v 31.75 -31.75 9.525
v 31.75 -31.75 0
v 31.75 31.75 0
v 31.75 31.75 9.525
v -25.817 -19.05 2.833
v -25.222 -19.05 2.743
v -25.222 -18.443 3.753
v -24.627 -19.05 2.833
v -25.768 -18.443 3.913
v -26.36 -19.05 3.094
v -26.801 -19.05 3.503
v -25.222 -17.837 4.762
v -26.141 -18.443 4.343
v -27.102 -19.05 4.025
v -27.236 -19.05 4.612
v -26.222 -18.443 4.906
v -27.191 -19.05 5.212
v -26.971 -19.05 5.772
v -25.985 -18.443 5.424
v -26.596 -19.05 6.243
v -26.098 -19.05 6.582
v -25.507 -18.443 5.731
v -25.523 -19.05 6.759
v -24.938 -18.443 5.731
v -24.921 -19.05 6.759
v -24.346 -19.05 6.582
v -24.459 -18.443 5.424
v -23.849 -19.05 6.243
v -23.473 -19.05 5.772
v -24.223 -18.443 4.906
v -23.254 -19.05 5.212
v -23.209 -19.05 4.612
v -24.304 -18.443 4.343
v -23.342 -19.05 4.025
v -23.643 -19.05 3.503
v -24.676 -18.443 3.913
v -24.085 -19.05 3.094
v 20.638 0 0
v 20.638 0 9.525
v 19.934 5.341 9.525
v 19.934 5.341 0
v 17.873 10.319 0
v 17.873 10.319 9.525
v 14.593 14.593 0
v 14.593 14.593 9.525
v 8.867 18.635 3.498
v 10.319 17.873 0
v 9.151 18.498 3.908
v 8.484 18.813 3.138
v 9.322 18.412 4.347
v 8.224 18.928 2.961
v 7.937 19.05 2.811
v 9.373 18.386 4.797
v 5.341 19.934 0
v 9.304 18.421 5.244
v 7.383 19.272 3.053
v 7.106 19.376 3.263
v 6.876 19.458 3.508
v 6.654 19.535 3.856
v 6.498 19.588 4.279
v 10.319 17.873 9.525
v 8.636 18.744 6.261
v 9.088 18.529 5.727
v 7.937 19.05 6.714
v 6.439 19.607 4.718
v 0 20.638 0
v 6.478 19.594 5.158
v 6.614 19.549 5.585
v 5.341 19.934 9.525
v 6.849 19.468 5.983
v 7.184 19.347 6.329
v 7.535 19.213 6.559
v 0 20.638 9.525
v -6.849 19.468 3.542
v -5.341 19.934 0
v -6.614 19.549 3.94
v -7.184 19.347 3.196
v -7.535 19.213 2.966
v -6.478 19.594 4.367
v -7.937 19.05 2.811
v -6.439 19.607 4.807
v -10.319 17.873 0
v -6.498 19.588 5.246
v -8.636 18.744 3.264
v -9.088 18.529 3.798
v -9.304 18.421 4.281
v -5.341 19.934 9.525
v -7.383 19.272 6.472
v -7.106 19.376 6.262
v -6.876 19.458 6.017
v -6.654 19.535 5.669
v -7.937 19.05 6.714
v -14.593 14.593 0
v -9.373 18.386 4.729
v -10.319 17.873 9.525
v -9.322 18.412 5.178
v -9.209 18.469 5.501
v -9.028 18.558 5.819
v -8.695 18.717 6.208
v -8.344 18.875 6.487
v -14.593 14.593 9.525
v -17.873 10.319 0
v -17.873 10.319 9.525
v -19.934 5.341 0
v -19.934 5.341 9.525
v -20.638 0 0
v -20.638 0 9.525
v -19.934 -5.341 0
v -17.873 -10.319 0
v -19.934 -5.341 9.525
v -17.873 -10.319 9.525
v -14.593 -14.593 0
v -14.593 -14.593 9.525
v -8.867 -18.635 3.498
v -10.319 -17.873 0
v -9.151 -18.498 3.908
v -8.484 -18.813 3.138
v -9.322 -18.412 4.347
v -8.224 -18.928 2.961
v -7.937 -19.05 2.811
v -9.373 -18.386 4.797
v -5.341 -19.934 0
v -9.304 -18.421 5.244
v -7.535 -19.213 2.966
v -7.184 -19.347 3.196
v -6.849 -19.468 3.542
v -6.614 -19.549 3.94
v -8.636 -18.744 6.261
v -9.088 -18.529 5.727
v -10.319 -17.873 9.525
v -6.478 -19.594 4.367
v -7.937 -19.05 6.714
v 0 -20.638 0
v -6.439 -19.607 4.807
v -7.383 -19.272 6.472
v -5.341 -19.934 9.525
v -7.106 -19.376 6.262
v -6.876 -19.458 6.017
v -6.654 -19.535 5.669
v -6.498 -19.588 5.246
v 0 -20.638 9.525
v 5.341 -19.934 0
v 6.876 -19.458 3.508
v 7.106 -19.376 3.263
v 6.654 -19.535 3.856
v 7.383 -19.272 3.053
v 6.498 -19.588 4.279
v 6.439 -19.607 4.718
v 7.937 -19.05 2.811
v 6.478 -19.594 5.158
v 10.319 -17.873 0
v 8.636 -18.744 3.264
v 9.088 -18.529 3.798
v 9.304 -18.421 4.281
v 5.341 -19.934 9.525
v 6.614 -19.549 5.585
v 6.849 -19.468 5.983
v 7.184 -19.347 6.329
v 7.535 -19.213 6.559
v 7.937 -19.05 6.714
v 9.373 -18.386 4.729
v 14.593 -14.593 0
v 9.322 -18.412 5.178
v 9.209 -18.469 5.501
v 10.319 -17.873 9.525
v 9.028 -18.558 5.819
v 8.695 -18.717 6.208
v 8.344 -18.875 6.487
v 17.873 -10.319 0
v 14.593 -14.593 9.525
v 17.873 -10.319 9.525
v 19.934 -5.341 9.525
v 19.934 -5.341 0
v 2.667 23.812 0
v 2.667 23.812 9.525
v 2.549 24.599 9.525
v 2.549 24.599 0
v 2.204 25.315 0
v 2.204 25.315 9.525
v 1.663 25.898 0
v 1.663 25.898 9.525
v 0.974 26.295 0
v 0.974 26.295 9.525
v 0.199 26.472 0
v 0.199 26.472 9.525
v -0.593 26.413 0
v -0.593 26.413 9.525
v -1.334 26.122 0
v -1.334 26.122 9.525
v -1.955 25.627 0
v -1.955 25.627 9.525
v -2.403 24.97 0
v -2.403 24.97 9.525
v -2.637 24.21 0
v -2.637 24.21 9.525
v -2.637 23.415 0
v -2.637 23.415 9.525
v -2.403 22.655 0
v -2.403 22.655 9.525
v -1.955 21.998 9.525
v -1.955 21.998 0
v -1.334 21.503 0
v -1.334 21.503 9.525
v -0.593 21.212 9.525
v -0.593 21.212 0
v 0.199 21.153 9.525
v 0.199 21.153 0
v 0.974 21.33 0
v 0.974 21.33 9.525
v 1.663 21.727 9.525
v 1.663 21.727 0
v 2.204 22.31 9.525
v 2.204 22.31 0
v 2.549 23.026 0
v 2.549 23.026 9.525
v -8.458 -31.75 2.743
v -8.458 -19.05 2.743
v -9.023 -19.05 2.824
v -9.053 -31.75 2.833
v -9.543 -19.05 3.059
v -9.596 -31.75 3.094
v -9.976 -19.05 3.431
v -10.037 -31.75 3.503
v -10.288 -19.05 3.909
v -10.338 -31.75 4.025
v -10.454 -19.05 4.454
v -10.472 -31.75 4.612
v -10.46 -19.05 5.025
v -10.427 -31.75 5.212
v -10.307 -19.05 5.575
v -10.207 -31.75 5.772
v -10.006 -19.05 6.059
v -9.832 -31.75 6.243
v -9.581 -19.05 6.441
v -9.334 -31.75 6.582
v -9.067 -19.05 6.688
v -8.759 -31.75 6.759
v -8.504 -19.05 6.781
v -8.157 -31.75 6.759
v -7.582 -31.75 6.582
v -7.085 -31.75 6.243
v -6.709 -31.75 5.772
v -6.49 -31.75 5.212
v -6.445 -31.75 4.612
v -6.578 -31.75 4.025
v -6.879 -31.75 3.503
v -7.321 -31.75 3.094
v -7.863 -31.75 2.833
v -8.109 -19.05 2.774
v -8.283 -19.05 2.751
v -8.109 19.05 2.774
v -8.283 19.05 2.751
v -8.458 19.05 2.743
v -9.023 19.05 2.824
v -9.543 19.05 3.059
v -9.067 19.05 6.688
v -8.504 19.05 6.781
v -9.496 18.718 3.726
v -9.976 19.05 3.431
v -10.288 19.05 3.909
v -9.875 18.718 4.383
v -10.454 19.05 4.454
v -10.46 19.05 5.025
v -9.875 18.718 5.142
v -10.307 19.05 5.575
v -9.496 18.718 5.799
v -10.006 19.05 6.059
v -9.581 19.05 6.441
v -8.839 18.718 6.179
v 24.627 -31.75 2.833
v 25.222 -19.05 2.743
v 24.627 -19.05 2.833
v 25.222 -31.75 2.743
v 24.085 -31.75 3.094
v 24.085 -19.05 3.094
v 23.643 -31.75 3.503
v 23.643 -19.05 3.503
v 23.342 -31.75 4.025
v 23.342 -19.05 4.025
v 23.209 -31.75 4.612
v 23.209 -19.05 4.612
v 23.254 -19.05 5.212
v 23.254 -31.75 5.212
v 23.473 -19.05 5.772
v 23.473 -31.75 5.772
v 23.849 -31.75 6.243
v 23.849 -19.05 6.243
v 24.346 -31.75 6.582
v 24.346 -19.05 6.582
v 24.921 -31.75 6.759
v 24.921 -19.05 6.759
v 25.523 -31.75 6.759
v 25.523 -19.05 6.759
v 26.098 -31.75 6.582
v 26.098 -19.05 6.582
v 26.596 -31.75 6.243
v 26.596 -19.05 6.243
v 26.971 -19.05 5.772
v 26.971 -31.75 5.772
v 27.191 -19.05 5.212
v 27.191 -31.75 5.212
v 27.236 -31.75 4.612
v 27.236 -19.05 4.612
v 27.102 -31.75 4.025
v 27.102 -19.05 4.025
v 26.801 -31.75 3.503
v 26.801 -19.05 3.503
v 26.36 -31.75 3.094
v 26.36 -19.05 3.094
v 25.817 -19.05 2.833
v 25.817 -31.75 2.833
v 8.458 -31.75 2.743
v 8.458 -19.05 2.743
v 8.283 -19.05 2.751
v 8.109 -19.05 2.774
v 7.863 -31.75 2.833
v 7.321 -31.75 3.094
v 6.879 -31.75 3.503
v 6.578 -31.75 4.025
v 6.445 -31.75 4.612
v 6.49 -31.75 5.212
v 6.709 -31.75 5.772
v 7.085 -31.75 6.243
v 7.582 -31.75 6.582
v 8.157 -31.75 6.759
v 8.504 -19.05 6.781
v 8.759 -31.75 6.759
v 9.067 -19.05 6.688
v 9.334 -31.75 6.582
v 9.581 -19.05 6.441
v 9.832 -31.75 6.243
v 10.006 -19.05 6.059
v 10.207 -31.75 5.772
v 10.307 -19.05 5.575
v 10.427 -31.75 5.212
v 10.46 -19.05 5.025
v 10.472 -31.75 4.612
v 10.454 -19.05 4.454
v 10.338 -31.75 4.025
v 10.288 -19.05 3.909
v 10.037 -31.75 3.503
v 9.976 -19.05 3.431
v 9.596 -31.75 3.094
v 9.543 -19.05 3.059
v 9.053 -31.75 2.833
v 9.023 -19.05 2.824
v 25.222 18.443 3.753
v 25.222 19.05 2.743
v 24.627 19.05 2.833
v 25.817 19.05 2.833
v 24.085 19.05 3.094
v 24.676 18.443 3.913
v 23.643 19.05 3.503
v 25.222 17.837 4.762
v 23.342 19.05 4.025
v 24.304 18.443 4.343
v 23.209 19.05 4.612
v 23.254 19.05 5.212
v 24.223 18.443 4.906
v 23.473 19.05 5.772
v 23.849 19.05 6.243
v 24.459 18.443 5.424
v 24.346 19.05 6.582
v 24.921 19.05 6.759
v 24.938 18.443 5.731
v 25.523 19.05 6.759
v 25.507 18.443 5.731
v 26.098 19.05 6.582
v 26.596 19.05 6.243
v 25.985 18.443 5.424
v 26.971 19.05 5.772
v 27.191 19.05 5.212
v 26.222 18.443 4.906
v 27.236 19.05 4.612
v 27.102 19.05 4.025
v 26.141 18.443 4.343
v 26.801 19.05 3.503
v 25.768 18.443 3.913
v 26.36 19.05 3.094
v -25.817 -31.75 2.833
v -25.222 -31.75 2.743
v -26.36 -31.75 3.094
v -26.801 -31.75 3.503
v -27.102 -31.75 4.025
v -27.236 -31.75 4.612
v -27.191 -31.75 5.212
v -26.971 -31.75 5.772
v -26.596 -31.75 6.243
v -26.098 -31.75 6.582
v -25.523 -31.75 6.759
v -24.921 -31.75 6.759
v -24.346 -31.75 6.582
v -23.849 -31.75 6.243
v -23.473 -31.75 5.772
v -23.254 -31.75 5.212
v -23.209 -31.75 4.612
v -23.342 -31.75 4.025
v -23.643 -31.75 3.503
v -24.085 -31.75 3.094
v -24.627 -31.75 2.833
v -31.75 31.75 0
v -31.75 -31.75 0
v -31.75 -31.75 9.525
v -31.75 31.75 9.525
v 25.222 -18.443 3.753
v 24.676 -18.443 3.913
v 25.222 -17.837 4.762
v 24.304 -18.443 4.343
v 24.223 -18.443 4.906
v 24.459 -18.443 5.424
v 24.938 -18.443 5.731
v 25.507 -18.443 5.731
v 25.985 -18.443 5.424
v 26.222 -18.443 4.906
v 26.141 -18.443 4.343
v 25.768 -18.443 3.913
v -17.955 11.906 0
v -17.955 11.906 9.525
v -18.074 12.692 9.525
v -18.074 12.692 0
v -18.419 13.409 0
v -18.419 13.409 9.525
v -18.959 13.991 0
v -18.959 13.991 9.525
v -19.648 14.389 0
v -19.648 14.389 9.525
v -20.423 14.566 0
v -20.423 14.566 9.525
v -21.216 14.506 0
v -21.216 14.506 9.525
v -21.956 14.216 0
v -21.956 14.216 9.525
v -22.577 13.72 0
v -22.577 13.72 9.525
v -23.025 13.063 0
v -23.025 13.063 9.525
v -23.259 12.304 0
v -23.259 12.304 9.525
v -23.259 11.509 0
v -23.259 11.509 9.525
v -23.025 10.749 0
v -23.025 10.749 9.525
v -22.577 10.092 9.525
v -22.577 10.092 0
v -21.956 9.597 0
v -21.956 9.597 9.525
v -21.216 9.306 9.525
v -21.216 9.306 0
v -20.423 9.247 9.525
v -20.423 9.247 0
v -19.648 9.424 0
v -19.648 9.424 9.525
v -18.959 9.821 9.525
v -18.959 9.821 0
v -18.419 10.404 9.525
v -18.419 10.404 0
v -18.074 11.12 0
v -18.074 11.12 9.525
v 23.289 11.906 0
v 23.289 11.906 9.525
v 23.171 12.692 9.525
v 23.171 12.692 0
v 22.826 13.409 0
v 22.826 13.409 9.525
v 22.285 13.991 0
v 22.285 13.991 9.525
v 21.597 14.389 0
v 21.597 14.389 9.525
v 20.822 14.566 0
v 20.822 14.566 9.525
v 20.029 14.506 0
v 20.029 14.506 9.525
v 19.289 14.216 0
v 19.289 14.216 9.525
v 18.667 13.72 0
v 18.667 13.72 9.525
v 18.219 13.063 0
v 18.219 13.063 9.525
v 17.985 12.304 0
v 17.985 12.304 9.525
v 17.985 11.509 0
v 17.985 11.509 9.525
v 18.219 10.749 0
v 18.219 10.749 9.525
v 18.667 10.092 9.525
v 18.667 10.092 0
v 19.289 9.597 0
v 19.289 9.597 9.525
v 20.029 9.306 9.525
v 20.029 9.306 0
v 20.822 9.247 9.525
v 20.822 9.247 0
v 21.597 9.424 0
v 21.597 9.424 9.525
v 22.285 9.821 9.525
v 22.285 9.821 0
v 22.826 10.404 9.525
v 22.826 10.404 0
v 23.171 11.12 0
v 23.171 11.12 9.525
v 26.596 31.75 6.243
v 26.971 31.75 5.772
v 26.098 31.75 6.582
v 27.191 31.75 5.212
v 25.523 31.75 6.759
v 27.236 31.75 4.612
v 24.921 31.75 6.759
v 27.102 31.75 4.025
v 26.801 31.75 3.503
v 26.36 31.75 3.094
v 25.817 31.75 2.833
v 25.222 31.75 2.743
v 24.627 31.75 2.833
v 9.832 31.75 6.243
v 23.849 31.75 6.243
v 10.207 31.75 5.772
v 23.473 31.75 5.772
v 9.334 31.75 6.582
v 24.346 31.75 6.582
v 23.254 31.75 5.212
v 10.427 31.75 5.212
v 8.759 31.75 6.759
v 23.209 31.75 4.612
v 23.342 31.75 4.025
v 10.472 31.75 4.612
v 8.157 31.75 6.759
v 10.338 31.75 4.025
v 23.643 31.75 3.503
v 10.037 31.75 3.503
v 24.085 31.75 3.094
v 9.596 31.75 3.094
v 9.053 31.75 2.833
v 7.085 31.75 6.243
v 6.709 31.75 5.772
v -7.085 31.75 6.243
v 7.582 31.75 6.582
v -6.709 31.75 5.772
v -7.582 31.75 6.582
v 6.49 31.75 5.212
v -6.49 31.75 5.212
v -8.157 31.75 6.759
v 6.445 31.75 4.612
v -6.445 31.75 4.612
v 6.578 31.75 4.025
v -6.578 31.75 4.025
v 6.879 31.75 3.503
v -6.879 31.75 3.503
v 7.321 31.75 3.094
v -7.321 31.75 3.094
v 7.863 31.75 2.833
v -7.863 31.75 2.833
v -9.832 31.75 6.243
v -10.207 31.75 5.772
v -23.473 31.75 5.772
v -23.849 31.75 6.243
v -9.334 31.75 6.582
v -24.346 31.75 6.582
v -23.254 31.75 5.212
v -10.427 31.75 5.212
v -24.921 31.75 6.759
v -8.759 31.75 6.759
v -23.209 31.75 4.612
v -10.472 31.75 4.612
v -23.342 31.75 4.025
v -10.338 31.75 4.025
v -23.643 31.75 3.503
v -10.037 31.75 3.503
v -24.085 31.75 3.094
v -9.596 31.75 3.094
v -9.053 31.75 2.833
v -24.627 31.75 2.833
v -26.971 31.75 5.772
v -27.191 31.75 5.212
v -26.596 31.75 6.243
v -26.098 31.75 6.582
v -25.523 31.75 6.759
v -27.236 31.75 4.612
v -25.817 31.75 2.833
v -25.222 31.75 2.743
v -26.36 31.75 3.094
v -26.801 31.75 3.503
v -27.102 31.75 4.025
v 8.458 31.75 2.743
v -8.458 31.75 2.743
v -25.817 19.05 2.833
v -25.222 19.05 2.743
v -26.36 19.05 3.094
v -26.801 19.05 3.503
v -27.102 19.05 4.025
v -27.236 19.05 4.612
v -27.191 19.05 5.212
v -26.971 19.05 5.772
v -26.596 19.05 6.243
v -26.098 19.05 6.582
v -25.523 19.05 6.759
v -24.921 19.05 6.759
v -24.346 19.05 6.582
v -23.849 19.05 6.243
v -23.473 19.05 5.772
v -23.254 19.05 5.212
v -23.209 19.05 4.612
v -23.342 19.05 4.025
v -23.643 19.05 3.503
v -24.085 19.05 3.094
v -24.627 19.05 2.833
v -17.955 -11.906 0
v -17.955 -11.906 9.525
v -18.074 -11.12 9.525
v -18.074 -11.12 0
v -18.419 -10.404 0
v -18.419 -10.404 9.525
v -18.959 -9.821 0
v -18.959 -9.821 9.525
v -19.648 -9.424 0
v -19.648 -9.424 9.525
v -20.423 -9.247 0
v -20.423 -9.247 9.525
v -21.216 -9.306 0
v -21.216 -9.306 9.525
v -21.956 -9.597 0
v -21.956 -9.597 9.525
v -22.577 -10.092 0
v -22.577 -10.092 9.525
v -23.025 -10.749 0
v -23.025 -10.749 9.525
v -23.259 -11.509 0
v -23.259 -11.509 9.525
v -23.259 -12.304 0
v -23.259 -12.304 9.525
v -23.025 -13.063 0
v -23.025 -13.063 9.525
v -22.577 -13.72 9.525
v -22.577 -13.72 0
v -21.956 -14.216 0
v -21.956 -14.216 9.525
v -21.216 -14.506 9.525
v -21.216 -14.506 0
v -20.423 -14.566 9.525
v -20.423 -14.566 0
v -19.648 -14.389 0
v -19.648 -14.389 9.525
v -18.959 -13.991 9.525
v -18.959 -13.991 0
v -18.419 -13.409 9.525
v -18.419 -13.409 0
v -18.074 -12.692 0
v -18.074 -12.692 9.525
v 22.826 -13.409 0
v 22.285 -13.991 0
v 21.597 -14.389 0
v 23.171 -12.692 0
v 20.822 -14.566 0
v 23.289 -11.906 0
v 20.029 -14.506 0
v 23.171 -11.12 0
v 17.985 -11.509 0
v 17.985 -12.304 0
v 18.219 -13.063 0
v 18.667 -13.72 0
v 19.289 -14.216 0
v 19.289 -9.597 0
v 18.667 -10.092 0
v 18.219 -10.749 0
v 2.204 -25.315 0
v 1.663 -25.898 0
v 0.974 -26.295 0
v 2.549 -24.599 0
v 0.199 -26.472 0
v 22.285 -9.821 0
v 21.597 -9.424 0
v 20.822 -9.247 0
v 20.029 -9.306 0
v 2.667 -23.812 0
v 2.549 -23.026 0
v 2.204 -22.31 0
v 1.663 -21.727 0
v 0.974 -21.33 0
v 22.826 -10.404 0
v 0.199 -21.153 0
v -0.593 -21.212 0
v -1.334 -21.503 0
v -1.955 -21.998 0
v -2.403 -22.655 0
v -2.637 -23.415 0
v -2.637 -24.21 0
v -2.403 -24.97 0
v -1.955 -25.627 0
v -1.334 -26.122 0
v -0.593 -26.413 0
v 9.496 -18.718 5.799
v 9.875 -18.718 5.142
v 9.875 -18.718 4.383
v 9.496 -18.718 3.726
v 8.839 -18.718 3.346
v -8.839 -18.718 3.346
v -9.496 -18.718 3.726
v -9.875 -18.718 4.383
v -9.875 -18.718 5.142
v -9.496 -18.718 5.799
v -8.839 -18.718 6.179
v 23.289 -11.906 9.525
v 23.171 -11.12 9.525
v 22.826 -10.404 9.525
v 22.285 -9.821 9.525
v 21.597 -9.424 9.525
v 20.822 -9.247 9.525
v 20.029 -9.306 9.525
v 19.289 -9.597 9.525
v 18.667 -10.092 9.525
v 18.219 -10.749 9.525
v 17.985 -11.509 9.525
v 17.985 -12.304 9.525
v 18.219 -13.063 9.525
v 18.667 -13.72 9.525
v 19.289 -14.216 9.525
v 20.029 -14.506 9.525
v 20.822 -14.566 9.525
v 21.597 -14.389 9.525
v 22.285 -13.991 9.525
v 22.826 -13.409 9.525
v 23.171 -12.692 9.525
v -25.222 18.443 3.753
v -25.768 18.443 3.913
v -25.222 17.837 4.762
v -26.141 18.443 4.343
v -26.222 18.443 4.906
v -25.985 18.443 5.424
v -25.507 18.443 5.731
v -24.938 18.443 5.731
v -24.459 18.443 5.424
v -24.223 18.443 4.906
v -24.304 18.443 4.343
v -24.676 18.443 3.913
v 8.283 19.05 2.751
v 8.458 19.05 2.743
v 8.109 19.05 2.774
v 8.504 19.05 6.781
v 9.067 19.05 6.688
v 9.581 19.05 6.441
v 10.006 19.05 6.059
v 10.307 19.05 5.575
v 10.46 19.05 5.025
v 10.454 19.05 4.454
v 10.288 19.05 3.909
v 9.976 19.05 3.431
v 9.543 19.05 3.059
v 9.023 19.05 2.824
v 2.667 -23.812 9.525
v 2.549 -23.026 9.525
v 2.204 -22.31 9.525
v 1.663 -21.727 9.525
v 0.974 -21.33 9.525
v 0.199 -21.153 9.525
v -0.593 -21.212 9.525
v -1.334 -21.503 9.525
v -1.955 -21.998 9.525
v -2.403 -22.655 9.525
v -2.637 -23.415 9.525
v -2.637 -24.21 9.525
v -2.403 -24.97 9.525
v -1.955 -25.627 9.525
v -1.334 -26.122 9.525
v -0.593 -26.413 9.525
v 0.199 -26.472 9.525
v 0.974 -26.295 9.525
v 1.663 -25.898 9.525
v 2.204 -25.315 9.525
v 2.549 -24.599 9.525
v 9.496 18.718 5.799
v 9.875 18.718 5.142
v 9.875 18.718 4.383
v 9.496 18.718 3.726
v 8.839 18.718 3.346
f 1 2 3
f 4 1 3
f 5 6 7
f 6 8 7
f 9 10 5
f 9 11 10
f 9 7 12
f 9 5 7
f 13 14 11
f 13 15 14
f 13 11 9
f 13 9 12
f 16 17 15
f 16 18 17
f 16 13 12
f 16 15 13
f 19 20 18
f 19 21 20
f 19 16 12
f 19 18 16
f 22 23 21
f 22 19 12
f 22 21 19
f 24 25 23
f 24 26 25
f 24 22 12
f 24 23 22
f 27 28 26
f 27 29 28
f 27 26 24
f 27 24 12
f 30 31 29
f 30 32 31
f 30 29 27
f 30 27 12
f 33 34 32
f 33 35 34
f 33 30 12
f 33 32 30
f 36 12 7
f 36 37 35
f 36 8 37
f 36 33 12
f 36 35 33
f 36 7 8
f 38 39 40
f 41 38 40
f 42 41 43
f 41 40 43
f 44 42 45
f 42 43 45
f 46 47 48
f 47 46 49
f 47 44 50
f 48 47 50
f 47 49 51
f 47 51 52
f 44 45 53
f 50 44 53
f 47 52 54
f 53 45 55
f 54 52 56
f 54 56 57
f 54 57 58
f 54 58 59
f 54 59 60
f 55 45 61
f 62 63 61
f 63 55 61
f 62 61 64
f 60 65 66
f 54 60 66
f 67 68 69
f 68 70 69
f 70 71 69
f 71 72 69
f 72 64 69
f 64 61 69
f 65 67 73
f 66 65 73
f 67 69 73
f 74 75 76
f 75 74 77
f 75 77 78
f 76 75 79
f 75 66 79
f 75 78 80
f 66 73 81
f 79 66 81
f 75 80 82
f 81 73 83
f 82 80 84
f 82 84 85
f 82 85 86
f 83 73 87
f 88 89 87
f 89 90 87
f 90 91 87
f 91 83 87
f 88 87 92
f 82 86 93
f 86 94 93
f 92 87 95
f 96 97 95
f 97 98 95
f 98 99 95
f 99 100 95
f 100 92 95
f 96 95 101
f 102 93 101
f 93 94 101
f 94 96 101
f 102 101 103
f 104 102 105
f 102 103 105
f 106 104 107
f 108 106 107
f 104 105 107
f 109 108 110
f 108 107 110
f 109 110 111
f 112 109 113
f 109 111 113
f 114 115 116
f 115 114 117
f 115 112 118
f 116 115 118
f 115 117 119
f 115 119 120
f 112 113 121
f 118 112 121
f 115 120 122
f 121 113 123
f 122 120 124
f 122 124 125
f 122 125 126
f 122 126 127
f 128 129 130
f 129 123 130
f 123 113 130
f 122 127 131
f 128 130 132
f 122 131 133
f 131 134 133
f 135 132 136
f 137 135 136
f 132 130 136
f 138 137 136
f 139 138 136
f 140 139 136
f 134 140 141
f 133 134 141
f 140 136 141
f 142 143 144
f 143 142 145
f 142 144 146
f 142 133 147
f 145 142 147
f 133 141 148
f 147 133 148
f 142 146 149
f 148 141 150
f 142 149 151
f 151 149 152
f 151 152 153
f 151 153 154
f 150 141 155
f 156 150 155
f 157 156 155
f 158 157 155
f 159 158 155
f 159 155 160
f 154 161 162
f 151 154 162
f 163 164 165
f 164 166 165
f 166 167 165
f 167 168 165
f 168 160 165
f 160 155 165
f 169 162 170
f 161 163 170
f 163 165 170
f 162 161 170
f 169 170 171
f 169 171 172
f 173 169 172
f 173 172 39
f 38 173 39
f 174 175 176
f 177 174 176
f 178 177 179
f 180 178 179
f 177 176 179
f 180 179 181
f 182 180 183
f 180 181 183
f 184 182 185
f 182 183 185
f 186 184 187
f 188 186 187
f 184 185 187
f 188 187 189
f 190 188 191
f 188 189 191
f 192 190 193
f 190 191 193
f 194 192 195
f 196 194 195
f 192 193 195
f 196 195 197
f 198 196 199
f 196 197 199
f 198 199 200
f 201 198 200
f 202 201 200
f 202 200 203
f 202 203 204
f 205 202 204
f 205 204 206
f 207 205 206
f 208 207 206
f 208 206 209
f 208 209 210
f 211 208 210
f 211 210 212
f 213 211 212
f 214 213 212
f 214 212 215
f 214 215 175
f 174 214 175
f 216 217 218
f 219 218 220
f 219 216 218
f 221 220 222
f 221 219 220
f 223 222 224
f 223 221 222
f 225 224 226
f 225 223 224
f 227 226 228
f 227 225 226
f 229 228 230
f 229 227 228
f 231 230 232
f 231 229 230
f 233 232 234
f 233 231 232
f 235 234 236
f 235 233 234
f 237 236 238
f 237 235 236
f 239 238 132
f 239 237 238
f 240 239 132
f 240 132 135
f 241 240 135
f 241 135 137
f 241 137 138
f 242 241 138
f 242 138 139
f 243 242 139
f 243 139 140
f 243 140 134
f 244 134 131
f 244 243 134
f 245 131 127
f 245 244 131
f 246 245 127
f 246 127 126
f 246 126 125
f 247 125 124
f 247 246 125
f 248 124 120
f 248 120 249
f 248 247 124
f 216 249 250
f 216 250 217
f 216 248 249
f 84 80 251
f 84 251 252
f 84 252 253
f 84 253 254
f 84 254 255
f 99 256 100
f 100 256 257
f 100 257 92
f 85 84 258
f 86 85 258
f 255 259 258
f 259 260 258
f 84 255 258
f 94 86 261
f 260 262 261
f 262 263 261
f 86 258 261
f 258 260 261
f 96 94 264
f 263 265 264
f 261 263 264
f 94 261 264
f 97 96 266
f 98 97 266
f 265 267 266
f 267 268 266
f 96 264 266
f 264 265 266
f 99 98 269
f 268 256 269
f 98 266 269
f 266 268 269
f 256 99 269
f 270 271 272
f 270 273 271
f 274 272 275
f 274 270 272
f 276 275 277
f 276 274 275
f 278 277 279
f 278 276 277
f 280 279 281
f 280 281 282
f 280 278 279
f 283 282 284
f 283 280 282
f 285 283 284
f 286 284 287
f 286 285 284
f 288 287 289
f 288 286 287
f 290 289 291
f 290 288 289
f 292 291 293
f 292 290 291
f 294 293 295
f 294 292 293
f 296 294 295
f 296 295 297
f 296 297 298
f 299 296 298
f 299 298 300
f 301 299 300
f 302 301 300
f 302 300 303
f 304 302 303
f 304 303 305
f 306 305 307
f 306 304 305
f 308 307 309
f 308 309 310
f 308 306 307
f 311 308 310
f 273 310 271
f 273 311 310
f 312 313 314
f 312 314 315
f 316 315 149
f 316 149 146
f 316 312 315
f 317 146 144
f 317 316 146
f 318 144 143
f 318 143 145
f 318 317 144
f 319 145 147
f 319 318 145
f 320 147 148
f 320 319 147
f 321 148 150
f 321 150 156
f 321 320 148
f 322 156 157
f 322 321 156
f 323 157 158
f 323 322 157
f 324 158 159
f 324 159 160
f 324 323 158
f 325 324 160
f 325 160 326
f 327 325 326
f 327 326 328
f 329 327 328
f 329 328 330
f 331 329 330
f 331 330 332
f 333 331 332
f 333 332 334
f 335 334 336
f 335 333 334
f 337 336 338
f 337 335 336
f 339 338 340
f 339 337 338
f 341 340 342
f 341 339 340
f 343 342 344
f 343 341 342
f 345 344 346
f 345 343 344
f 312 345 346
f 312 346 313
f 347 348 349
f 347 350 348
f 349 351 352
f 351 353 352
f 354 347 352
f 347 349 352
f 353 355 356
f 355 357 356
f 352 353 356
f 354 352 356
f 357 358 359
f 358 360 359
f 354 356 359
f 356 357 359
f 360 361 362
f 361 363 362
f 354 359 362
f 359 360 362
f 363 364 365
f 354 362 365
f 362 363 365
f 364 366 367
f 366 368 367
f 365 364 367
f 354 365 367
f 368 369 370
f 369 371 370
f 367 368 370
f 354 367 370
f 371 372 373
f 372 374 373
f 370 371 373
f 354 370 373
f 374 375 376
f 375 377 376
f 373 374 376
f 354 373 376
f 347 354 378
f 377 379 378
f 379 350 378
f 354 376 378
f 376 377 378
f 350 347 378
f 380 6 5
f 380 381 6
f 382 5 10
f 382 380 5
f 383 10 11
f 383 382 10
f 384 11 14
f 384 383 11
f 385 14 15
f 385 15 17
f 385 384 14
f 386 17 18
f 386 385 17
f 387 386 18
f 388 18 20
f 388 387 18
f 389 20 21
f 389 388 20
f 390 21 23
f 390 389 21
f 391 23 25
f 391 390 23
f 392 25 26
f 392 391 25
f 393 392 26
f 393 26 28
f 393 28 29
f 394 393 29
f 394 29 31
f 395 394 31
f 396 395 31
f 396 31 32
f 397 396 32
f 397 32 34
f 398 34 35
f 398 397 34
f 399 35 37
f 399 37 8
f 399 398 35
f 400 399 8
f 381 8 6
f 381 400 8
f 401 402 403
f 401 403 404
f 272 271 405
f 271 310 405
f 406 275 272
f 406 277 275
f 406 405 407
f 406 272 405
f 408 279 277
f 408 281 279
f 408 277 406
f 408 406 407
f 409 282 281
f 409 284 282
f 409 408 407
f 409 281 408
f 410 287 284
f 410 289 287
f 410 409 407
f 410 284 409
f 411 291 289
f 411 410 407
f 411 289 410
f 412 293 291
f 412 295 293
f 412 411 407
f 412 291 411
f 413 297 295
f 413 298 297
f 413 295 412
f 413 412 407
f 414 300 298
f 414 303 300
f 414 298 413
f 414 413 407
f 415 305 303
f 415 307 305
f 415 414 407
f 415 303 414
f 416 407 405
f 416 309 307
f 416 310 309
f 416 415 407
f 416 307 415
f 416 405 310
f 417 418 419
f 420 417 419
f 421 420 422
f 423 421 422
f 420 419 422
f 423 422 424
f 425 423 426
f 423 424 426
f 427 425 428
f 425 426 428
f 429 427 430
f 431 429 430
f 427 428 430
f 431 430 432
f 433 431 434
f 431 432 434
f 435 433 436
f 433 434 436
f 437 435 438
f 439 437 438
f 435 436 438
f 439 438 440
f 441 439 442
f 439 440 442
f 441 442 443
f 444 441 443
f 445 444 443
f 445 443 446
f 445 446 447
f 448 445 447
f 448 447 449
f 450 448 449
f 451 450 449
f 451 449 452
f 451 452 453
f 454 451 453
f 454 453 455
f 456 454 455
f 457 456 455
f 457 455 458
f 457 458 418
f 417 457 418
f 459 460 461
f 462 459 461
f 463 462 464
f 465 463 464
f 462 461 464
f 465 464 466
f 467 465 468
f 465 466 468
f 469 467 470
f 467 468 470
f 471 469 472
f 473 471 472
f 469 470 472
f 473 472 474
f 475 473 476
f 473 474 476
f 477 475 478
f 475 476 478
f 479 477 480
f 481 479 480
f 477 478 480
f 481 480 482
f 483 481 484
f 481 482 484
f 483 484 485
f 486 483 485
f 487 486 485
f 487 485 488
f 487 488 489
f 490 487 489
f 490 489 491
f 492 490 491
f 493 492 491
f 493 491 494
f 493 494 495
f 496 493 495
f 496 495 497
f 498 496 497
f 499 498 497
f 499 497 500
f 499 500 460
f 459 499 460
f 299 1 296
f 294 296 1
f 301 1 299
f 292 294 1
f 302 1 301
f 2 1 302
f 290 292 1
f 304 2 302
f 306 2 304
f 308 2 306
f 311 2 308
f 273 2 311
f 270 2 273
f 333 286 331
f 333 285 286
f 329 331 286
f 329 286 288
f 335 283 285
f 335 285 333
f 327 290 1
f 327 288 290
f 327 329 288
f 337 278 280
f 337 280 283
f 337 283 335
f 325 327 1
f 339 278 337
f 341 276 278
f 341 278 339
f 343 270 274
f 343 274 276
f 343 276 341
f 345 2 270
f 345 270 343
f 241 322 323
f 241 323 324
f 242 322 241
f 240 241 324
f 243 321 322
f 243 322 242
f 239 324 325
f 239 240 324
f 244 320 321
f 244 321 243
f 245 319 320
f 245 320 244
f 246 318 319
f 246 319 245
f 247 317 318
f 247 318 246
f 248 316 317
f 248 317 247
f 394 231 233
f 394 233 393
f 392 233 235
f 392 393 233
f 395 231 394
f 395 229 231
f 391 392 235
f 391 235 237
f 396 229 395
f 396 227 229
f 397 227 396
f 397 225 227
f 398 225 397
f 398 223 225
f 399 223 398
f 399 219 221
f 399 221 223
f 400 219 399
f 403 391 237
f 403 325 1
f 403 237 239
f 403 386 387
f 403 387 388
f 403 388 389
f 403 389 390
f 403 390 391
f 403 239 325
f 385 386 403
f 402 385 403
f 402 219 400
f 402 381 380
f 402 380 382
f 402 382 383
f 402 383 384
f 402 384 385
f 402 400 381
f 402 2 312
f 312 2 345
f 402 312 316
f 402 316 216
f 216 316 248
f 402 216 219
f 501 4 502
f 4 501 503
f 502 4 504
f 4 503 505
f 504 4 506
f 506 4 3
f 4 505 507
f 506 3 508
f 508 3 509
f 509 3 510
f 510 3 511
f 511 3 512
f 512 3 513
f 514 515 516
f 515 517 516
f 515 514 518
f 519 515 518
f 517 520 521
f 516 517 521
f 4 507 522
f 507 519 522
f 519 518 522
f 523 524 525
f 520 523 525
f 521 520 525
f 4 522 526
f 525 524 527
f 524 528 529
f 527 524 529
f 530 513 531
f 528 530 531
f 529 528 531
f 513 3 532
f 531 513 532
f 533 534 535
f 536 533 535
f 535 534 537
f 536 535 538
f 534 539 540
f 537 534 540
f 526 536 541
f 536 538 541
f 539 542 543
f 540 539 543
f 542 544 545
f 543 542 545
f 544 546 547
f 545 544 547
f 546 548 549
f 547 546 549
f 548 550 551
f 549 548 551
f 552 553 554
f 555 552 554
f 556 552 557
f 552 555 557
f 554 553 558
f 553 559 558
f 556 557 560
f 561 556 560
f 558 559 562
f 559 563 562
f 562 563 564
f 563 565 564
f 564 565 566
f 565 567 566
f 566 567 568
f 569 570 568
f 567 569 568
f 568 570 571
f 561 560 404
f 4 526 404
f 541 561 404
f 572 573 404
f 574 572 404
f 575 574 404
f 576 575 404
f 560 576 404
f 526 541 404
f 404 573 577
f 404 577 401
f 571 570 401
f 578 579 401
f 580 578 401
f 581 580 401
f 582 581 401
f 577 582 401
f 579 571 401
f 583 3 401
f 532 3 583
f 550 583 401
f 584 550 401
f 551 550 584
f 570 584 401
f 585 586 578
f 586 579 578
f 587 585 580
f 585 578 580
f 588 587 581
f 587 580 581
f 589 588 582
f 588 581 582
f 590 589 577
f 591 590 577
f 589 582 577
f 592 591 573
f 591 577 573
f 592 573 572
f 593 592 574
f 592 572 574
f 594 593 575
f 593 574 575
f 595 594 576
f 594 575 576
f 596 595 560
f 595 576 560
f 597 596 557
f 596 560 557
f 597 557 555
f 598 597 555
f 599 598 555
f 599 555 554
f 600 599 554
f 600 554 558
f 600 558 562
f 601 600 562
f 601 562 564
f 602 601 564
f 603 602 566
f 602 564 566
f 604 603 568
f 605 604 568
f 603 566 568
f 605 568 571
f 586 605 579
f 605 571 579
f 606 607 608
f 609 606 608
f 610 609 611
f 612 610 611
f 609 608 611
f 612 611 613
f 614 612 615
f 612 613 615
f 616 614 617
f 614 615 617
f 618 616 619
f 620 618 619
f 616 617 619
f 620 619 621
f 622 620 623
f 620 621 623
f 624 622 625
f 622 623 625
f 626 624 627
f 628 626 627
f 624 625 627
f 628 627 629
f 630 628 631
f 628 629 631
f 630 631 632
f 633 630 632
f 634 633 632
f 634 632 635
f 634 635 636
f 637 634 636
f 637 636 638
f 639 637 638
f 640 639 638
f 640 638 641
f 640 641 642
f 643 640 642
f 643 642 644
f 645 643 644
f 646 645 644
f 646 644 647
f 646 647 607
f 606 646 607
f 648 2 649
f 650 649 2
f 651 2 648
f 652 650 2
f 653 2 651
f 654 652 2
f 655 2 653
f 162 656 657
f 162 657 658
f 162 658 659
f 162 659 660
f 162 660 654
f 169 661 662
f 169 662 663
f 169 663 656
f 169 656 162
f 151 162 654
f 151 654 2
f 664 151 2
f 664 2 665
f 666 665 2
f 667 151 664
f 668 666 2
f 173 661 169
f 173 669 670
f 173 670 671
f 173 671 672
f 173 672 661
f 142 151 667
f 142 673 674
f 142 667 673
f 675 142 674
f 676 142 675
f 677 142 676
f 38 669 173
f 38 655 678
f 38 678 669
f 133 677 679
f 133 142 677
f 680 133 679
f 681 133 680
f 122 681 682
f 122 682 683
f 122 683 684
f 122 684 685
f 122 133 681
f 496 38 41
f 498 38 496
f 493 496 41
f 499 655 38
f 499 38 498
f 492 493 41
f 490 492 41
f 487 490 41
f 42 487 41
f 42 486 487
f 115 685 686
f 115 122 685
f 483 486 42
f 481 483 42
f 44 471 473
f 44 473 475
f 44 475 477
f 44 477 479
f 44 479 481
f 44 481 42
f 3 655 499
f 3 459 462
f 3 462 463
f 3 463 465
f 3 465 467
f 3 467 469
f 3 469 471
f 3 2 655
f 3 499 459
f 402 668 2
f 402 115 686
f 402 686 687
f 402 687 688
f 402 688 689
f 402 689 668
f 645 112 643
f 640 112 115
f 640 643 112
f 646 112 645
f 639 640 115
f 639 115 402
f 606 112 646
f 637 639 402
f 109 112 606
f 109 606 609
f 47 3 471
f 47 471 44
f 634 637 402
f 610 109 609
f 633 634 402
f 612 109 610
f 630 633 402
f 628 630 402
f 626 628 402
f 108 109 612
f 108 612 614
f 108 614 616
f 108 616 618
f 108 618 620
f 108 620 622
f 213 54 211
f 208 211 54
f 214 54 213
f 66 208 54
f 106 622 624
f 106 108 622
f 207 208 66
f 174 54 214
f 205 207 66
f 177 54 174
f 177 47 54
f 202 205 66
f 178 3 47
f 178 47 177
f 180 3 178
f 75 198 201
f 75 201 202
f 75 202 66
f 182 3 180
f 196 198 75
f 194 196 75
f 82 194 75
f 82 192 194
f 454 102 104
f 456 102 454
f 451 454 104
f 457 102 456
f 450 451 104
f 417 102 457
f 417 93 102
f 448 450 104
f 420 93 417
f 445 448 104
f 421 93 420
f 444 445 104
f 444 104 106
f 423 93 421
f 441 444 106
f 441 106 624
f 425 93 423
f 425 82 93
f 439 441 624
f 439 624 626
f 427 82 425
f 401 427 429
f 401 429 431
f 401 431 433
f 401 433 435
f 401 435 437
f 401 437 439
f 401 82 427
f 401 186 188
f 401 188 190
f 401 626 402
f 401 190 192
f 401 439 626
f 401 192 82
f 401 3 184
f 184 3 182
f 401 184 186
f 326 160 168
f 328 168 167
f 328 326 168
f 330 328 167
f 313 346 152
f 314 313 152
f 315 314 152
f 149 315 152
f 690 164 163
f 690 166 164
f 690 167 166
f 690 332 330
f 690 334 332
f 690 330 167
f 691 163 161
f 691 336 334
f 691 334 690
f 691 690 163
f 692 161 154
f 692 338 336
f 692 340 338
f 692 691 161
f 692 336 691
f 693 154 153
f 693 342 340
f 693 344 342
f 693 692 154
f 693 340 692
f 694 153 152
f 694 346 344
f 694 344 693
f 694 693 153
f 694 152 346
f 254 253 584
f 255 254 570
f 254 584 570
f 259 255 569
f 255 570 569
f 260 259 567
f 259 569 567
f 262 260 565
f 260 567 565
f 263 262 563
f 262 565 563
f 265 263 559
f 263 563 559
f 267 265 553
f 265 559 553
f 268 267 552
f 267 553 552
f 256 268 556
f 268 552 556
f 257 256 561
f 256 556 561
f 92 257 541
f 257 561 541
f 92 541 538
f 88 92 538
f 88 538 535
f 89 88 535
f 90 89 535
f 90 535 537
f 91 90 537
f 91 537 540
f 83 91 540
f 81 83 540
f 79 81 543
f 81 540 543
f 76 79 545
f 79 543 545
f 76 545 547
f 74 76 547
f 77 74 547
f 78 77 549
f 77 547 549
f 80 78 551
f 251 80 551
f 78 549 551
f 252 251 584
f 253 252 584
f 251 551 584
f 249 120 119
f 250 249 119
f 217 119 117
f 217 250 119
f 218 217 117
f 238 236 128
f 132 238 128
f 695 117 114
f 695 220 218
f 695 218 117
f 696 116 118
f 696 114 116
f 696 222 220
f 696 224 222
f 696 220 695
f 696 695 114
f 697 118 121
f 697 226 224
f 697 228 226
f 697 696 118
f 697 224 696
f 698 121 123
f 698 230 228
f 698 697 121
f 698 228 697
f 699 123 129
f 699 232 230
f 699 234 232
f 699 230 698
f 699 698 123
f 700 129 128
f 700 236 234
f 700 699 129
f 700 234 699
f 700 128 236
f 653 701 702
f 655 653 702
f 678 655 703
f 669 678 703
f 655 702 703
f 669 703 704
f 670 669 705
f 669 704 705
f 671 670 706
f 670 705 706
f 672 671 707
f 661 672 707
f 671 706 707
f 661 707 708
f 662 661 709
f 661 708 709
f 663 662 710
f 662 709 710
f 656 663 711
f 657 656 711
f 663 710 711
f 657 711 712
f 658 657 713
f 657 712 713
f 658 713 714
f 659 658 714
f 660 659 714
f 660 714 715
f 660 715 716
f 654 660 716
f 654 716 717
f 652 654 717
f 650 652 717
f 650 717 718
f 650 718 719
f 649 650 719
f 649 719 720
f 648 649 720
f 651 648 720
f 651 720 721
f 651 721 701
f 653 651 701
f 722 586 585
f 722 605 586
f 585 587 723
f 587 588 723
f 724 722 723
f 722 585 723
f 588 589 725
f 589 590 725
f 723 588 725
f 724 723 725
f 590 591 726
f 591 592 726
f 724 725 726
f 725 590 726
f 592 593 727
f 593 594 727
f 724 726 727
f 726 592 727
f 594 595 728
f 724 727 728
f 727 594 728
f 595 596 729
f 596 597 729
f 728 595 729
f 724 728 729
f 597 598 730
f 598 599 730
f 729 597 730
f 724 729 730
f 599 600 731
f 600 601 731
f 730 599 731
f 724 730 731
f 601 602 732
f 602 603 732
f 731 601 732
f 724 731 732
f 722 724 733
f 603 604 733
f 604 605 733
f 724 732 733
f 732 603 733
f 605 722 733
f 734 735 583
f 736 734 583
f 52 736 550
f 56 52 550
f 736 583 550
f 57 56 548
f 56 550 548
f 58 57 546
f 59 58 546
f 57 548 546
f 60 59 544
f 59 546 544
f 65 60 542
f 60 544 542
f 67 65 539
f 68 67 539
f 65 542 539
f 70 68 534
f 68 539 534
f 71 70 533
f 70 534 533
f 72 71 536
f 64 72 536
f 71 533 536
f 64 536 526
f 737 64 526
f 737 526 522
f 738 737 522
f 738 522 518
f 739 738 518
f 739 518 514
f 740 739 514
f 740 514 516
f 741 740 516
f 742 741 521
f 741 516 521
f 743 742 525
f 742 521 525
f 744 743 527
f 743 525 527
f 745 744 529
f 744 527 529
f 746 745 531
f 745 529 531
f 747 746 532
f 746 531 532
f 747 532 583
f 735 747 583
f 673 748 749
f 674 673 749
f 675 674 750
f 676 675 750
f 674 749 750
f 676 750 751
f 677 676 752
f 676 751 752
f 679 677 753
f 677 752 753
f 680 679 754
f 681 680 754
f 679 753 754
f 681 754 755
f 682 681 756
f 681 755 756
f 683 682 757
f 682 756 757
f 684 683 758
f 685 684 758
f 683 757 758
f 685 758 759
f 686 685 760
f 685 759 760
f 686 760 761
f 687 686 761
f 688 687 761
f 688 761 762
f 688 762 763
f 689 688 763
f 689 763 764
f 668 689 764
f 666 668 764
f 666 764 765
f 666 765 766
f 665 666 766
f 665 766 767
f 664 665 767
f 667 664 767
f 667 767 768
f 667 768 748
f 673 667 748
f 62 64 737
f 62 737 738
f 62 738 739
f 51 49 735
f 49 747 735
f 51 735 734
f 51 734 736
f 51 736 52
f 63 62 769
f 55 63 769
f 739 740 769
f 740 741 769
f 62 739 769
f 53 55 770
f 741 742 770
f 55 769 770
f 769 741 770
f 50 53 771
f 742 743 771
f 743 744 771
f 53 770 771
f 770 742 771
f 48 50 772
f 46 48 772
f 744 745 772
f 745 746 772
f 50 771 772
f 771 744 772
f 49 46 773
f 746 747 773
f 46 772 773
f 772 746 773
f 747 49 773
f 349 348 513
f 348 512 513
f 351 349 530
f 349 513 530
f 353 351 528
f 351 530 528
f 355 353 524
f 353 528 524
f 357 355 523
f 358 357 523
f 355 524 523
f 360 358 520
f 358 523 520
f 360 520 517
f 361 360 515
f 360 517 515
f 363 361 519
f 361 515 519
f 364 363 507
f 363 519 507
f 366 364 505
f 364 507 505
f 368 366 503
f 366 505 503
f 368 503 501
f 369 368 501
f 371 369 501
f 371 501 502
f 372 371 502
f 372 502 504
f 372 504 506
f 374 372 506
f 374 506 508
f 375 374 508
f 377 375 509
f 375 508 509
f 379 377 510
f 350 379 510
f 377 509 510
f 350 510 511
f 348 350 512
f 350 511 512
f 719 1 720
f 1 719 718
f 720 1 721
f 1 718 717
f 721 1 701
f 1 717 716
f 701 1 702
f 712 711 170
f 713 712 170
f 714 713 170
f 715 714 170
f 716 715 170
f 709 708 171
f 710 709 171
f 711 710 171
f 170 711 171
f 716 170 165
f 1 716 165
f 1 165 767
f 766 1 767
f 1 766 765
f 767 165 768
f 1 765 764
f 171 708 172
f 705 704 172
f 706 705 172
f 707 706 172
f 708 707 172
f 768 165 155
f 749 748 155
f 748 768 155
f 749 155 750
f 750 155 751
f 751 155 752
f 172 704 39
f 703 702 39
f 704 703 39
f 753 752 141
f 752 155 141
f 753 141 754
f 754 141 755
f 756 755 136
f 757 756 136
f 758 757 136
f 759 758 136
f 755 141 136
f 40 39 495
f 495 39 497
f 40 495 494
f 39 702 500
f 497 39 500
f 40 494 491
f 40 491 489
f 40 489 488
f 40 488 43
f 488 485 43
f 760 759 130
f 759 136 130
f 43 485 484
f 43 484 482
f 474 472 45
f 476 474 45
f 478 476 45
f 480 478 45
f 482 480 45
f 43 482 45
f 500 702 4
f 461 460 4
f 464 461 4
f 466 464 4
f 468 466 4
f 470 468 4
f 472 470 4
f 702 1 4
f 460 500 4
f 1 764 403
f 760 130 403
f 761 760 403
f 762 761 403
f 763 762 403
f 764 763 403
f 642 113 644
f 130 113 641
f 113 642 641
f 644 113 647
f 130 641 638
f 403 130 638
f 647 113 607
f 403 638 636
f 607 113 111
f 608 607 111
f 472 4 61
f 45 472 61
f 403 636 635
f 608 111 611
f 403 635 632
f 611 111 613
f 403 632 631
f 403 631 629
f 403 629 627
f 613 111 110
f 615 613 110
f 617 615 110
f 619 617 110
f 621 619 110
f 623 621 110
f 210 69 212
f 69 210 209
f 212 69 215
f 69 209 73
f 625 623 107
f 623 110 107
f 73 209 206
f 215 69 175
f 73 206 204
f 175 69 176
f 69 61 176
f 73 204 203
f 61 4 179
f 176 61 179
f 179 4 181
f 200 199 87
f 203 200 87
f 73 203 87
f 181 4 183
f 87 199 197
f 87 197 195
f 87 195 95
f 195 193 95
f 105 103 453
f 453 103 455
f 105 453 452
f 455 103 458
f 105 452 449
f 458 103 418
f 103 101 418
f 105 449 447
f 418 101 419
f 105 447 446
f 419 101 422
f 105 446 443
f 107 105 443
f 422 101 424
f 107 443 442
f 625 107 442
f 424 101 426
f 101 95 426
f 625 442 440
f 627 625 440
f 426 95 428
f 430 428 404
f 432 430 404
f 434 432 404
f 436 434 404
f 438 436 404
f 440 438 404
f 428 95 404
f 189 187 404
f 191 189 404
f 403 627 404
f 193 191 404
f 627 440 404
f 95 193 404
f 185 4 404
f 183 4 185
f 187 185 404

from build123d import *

# Parameters (mm, degrees)
SKETCH1_W                       = 63.5
SKETCH1_H                       = 63.5
BOSS_EXTRUDE1_DEPTH             = 9.525
SKETCH2_R                       = 20.6375
CUT_EXTRUDE1_DEPTH              = 46.900442536
F_10_32_TAPPED_HOLE1_AT_2_COUNT = 2
F_10_32_TAPPED_HOLE1_AT_2_PITCH = 16.9164
F_10_32_TAPPED_HOLE1_AT_3_COUNT = 2
F_10_32_TAPPED_HOLE1_AT_3_PITCH = 33.6804
F_10_32_TAPPED_HOLE1_AT_4_COUNT = 2
F_10_32_TAPPED_HOLE1_AT_4_PITCH = 16.764
F_10_0_1935_DIAMETER_HOLE1_D    = 5.334


with BuildPart() as part:
    # Sketch1 → Boss-Extrude1 (new body)
    with BuildSketch(Plane(origin=(0, 0, 0), x_dir=(-1, 0, 0), z_dir=(0, 0, -1))):
        Rectangle(SKETCH1_W, SKETCH1_H)
    extrude(amount=-BOSS_EXTRUDE1_DEPTH)

    # Sketch2 → Cut-Extrude1 (cut, through all)
    with BuildSketch(Plane.XY.offset(9.525)):
        Circle(SKETCH2_R)
    extrude(amount=-CUT_EXTRUDE1_DEPTH, mode=Mode.SUBTRACT)

    # Sketch3 → #10-32 Tapped Hole1 (revolve, cut)
    with BuildSketch(Plane(origin=(8.4582, -31.75, 4.7625), x_dir=(0, 0, -1), z_dir=(1, 0, 0))):
        Polygon((0, 0), (0, 13.913317848), (2.0193, 12.7), (2.0193, 0), align=None)
    f_10_32_tapped_hole1 = revolve(axis=Axis((8.4582, -38.1, 4.7625), (0, 1, 0)), mode=Mode.SUBTRACT)

    # #10-32 Tapped Hole1 at 2: #10-32 Tapped Hole1 ×2
    with Locations(*[(-i * F_10_32_TAPPED_HOLE1_AT_2_PITCH, 0, 0) for i in range(1, F_10_32_TAPPED_HOLE1_AT_2_COUNT)]):
        add(f_10_32_tapped_hole1, mode=Mode.SUBTRACT)

    # #10-32 Tapped Hole1 at 3: #10-32 Tapped Hole1 ×2
    with Locations(*[(-i * F_10_32_TAPPED_HOLE1_AT_3_PITCH, 0, 0) for i in range(1, F_10_32_TAPPED_HOLE1_AT_3_COUNT)]):
        add(f_10_32_tapped_hole1, mode=Mode.SUBTRACT)

    # #10-32 Tapped Hole1 at 4: #10-32 Tapped Hole1 ×2
    with Locations(*[(i * F_10_32_TAPPED_HOLE1_AT_4_PITCH, 0, 0) for i in range(1, F_10_32_TAPPED_HOLE1_AT_4_COUNT)]):
        add(f_10_32_tapped_hole1, mode=Mode.SUBTRACT)

    # #10 (0.1935) Diameter Hole1 (through all)
    with Locations(Plane(origin=(0, 0, 0), x_dir=(-1, 0, 0), z_dir=(0, 0, -1))):
        with Locations((-20.622229928, 11.90625), (-20.622229928, -11.90625), (0, -23.8125), (20.622229928, -11.90625), (20.622229928, 11.90625), (0, 23.8125)):
            Hole(F_10_0_1935_DIAMETER_HOLE1_D / 2)

    # Mirror1: #10-32 Tapped Hole1 across plane
    add(f_10_32_tapped_hole1.mirror(Plane.ZX), mode=Mode.SUBTRACT)

    # Mirror1 copy 1 sketch → Mirror1 copy 1 (revolve, cut)
    with BuildSketch(Plane(origin=(-8.4582, 31.75, 4.7625), x_dir=(0, 0, -1), z_dir=(1, 0, 0))):
        Polygon((0, 0), (0, -13.913317848), (2.0193, -12.7), (2.0193, 0), align=None)
    revolve(axis=Axis((-8.4582, 38.1, 4.7625), (0, 1, 0)), mode=Mode.SUBTRACT)

    # Mirror1 copy 2 sketch → Mirror1 copy 2 (revolve, cut)
    with BuildSketch(Plane(origin=(-25.2222, 31.75, 4.7625), x_dir=(0, 0, -1), z_dir=(1, 0, 0))):
        Polygon((0, 0), (0, -13.913317848), (2.0193, -12.7), (2.0193, 0), align=None)
    revolve(axis=Axis((-25.2222, 38.1, 4.7625), (0, 1, 0)), mode=Mode.SUBTRACT)

    # Mirror1 copy 3 sketch → Mirror1 copy 3 (revolve, cut)
    with BuildSketch(Plane(origin=(25.2222, 31.75, 4.7625), x_dir=(0, 0, -1), z_dir=(1, 0, 0))):
        Polygon((0, 0), (0, -13.913317848), (2.0193, -12.7), (2.0193, 0), align=None)
    revolve(axis=Axis((25.2222, 38.1, 4.7625), (0, 1, 0)), mode=Mode.SUBTRACT)


solid = part.part
